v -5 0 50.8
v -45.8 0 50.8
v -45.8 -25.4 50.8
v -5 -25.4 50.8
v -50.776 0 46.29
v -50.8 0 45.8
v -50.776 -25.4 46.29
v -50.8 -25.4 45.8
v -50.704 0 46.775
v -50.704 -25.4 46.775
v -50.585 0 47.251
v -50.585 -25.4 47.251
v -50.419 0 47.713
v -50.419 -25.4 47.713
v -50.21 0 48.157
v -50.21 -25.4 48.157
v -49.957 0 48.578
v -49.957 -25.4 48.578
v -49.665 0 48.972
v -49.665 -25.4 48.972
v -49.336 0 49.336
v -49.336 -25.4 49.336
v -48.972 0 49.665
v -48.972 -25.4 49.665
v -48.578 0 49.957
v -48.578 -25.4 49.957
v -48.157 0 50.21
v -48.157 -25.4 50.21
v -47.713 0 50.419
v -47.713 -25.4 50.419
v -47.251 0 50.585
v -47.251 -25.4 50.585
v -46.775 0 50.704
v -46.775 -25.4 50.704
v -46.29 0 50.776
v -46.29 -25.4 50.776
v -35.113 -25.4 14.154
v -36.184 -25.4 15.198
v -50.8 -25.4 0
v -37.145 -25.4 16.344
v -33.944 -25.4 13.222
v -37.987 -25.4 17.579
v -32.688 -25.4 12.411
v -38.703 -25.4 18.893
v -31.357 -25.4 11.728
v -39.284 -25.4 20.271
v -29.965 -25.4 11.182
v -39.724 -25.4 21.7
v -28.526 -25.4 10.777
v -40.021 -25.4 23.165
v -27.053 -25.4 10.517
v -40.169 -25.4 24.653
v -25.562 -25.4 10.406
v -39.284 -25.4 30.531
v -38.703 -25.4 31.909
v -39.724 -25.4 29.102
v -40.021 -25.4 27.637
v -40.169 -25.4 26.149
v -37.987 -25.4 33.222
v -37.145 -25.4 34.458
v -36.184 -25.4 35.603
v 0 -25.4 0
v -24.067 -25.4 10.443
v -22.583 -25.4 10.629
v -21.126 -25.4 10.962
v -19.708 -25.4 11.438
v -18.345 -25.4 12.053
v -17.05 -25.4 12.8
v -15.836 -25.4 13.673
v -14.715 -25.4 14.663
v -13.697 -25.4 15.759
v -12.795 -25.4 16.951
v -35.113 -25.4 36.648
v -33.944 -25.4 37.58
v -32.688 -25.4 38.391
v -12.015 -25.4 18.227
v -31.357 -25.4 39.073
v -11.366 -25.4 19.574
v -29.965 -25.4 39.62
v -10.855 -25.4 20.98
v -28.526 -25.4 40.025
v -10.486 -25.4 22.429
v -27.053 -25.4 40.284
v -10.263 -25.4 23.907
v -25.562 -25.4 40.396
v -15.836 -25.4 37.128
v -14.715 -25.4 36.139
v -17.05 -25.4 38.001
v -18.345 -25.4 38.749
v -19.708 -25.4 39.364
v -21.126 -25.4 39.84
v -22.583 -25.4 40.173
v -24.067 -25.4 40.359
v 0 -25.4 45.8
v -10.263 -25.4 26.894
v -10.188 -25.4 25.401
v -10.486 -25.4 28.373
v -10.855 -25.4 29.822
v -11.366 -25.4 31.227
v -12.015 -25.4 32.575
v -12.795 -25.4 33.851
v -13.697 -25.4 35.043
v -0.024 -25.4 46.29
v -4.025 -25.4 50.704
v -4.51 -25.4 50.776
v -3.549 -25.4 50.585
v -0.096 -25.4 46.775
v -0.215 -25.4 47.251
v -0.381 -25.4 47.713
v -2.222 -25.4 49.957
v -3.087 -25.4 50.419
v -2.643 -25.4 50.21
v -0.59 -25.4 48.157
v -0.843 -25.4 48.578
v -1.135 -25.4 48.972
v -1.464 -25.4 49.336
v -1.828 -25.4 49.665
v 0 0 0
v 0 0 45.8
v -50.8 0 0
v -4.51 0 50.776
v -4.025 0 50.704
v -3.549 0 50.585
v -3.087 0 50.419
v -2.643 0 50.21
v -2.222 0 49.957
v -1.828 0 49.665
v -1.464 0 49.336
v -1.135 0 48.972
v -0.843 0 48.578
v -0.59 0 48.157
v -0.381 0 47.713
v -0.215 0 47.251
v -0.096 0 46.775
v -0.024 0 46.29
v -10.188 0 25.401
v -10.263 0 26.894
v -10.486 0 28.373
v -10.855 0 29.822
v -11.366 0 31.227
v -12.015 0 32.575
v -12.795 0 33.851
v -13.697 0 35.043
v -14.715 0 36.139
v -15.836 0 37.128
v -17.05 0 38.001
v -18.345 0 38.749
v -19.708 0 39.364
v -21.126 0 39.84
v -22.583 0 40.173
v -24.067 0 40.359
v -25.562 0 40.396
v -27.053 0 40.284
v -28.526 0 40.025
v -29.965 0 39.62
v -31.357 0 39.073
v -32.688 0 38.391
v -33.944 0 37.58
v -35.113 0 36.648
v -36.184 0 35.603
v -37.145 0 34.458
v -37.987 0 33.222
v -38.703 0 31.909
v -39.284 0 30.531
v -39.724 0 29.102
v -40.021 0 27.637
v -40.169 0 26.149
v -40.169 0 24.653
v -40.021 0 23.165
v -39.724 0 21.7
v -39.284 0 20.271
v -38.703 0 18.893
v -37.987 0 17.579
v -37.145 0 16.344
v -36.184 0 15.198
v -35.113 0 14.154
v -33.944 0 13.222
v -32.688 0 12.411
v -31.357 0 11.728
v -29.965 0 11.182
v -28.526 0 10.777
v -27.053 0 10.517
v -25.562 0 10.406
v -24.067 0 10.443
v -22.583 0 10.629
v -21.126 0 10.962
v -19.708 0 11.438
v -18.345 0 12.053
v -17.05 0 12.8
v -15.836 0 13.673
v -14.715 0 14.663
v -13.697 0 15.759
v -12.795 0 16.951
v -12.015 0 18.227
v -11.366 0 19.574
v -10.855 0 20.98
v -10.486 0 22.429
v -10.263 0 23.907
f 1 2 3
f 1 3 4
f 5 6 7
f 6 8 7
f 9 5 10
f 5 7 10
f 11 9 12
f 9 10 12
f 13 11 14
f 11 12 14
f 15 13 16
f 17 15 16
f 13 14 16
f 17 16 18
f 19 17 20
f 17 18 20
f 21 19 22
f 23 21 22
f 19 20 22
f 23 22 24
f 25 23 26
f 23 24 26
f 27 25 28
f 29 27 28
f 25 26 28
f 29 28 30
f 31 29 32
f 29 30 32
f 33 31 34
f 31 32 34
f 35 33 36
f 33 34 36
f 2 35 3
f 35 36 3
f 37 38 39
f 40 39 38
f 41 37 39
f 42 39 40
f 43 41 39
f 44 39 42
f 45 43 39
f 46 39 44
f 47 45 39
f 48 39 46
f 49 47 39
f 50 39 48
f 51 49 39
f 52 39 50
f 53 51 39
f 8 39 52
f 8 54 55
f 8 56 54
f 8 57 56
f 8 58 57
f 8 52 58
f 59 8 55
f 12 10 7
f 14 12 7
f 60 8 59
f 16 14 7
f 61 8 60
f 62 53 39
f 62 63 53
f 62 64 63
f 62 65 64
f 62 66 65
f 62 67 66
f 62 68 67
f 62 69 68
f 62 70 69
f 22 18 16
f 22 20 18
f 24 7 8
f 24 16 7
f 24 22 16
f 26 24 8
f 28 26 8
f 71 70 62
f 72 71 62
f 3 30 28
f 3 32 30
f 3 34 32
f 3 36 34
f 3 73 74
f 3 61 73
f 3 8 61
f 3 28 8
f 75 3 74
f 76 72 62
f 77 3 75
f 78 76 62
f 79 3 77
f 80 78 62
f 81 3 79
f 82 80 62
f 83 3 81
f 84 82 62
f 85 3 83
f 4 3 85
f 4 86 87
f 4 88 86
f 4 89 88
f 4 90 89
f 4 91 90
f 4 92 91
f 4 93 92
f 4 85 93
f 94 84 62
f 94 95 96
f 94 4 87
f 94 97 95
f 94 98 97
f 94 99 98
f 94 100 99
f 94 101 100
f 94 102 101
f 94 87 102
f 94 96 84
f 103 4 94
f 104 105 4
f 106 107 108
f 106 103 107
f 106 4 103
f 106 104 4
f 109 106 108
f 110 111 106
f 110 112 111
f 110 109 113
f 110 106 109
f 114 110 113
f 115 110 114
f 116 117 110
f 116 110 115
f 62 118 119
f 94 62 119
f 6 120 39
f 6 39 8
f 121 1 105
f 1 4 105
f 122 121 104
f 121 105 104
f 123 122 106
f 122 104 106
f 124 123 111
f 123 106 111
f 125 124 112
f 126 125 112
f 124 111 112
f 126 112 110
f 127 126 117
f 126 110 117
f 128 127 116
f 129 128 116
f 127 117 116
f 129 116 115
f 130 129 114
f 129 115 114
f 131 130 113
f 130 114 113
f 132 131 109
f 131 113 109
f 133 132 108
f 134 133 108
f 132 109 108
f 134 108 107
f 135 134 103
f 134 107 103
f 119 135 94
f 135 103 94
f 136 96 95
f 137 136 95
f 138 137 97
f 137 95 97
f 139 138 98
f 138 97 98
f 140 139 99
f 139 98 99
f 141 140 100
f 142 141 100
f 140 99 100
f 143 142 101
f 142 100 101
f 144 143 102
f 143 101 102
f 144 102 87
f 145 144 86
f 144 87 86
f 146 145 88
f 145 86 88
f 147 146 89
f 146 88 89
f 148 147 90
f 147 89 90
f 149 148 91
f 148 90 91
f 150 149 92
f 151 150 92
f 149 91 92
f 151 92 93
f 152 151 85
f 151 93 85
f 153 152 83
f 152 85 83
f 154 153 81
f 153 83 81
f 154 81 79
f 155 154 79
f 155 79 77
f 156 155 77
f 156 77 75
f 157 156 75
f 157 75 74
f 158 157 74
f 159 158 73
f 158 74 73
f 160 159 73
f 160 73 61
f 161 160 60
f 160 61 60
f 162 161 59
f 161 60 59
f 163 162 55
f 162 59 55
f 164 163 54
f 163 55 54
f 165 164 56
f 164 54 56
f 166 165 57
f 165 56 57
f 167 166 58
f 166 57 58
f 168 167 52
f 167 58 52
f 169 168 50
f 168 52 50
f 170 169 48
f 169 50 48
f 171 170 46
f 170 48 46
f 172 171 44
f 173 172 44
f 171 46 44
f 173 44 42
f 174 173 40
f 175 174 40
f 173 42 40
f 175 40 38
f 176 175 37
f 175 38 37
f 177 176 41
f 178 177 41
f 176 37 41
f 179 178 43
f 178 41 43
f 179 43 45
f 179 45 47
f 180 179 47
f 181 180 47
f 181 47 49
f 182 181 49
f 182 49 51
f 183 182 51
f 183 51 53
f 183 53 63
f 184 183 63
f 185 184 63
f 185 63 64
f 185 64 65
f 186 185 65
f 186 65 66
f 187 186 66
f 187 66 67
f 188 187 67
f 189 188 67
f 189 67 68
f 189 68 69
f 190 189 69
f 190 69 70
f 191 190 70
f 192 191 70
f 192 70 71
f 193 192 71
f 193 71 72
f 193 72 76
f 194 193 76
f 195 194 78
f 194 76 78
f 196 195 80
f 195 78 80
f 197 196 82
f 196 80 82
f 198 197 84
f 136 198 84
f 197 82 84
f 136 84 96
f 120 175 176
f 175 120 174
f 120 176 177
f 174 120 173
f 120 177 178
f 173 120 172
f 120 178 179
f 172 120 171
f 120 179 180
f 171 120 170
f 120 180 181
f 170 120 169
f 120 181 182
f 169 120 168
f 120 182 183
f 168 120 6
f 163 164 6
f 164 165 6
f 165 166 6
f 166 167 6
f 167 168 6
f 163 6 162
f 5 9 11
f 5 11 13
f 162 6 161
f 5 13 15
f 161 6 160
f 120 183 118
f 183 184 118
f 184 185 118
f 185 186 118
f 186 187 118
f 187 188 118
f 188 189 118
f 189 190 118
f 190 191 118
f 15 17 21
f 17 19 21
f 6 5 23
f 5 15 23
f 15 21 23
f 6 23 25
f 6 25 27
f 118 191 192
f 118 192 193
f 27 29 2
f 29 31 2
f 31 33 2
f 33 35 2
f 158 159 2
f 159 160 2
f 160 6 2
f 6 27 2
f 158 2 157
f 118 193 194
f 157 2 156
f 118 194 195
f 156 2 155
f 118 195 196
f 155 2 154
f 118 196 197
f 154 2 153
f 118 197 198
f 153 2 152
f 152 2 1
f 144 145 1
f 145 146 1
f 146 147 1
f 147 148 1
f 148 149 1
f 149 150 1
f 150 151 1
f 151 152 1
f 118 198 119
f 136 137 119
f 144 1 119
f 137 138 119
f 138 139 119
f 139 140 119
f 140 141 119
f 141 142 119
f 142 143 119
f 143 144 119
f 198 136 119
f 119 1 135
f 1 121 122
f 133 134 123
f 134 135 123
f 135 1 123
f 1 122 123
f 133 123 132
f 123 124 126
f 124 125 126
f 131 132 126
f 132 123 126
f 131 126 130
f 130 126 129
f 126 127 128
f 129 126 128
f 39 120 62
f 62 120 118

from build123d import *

# Parameters (mm, degrees)
F0_W     = 50.8
F0_H     = 50.8
F1_DEPTH = 25.4
F2_R     = 5
F3_R     = 5
F4_R     = 15
F5_DEPTH = 25.4


with BuildPart() as f1:
    # F0 (on Front) → F1 (new body)
    with BuildSketch(Plane.XZ):
        with Locations((-25.4, 25.4)):
            Rectangle(F0_W, F0_H)
    extrude(amount=F1_DEPTH)

    # F2
    f2_edges = [f1.edges().sort_by_distance(p)[0] for p in [
        (-50.8, -12.7, 50.8),
    ]]
    fillet(f2_edges, radius=F2_R)

    # F3
    f3_edges = [f1.edges().sort_by_distance(p)[0] for p in [
        (0, -12.7, 50.8),
    ]]
    fillet(f3_edges, radius=F3_R)

    # F4 (on face) → F5 (cut, through all)
    with BuildSketch(Plane.XZ.offset(25.4)):
        with Locations((-25.188129, 25.400884)):
            Circle(F4_R)
    extrude(amount=-F5_DEPTH, mode=Mode.SUBTRACT)


solid = f1.part
